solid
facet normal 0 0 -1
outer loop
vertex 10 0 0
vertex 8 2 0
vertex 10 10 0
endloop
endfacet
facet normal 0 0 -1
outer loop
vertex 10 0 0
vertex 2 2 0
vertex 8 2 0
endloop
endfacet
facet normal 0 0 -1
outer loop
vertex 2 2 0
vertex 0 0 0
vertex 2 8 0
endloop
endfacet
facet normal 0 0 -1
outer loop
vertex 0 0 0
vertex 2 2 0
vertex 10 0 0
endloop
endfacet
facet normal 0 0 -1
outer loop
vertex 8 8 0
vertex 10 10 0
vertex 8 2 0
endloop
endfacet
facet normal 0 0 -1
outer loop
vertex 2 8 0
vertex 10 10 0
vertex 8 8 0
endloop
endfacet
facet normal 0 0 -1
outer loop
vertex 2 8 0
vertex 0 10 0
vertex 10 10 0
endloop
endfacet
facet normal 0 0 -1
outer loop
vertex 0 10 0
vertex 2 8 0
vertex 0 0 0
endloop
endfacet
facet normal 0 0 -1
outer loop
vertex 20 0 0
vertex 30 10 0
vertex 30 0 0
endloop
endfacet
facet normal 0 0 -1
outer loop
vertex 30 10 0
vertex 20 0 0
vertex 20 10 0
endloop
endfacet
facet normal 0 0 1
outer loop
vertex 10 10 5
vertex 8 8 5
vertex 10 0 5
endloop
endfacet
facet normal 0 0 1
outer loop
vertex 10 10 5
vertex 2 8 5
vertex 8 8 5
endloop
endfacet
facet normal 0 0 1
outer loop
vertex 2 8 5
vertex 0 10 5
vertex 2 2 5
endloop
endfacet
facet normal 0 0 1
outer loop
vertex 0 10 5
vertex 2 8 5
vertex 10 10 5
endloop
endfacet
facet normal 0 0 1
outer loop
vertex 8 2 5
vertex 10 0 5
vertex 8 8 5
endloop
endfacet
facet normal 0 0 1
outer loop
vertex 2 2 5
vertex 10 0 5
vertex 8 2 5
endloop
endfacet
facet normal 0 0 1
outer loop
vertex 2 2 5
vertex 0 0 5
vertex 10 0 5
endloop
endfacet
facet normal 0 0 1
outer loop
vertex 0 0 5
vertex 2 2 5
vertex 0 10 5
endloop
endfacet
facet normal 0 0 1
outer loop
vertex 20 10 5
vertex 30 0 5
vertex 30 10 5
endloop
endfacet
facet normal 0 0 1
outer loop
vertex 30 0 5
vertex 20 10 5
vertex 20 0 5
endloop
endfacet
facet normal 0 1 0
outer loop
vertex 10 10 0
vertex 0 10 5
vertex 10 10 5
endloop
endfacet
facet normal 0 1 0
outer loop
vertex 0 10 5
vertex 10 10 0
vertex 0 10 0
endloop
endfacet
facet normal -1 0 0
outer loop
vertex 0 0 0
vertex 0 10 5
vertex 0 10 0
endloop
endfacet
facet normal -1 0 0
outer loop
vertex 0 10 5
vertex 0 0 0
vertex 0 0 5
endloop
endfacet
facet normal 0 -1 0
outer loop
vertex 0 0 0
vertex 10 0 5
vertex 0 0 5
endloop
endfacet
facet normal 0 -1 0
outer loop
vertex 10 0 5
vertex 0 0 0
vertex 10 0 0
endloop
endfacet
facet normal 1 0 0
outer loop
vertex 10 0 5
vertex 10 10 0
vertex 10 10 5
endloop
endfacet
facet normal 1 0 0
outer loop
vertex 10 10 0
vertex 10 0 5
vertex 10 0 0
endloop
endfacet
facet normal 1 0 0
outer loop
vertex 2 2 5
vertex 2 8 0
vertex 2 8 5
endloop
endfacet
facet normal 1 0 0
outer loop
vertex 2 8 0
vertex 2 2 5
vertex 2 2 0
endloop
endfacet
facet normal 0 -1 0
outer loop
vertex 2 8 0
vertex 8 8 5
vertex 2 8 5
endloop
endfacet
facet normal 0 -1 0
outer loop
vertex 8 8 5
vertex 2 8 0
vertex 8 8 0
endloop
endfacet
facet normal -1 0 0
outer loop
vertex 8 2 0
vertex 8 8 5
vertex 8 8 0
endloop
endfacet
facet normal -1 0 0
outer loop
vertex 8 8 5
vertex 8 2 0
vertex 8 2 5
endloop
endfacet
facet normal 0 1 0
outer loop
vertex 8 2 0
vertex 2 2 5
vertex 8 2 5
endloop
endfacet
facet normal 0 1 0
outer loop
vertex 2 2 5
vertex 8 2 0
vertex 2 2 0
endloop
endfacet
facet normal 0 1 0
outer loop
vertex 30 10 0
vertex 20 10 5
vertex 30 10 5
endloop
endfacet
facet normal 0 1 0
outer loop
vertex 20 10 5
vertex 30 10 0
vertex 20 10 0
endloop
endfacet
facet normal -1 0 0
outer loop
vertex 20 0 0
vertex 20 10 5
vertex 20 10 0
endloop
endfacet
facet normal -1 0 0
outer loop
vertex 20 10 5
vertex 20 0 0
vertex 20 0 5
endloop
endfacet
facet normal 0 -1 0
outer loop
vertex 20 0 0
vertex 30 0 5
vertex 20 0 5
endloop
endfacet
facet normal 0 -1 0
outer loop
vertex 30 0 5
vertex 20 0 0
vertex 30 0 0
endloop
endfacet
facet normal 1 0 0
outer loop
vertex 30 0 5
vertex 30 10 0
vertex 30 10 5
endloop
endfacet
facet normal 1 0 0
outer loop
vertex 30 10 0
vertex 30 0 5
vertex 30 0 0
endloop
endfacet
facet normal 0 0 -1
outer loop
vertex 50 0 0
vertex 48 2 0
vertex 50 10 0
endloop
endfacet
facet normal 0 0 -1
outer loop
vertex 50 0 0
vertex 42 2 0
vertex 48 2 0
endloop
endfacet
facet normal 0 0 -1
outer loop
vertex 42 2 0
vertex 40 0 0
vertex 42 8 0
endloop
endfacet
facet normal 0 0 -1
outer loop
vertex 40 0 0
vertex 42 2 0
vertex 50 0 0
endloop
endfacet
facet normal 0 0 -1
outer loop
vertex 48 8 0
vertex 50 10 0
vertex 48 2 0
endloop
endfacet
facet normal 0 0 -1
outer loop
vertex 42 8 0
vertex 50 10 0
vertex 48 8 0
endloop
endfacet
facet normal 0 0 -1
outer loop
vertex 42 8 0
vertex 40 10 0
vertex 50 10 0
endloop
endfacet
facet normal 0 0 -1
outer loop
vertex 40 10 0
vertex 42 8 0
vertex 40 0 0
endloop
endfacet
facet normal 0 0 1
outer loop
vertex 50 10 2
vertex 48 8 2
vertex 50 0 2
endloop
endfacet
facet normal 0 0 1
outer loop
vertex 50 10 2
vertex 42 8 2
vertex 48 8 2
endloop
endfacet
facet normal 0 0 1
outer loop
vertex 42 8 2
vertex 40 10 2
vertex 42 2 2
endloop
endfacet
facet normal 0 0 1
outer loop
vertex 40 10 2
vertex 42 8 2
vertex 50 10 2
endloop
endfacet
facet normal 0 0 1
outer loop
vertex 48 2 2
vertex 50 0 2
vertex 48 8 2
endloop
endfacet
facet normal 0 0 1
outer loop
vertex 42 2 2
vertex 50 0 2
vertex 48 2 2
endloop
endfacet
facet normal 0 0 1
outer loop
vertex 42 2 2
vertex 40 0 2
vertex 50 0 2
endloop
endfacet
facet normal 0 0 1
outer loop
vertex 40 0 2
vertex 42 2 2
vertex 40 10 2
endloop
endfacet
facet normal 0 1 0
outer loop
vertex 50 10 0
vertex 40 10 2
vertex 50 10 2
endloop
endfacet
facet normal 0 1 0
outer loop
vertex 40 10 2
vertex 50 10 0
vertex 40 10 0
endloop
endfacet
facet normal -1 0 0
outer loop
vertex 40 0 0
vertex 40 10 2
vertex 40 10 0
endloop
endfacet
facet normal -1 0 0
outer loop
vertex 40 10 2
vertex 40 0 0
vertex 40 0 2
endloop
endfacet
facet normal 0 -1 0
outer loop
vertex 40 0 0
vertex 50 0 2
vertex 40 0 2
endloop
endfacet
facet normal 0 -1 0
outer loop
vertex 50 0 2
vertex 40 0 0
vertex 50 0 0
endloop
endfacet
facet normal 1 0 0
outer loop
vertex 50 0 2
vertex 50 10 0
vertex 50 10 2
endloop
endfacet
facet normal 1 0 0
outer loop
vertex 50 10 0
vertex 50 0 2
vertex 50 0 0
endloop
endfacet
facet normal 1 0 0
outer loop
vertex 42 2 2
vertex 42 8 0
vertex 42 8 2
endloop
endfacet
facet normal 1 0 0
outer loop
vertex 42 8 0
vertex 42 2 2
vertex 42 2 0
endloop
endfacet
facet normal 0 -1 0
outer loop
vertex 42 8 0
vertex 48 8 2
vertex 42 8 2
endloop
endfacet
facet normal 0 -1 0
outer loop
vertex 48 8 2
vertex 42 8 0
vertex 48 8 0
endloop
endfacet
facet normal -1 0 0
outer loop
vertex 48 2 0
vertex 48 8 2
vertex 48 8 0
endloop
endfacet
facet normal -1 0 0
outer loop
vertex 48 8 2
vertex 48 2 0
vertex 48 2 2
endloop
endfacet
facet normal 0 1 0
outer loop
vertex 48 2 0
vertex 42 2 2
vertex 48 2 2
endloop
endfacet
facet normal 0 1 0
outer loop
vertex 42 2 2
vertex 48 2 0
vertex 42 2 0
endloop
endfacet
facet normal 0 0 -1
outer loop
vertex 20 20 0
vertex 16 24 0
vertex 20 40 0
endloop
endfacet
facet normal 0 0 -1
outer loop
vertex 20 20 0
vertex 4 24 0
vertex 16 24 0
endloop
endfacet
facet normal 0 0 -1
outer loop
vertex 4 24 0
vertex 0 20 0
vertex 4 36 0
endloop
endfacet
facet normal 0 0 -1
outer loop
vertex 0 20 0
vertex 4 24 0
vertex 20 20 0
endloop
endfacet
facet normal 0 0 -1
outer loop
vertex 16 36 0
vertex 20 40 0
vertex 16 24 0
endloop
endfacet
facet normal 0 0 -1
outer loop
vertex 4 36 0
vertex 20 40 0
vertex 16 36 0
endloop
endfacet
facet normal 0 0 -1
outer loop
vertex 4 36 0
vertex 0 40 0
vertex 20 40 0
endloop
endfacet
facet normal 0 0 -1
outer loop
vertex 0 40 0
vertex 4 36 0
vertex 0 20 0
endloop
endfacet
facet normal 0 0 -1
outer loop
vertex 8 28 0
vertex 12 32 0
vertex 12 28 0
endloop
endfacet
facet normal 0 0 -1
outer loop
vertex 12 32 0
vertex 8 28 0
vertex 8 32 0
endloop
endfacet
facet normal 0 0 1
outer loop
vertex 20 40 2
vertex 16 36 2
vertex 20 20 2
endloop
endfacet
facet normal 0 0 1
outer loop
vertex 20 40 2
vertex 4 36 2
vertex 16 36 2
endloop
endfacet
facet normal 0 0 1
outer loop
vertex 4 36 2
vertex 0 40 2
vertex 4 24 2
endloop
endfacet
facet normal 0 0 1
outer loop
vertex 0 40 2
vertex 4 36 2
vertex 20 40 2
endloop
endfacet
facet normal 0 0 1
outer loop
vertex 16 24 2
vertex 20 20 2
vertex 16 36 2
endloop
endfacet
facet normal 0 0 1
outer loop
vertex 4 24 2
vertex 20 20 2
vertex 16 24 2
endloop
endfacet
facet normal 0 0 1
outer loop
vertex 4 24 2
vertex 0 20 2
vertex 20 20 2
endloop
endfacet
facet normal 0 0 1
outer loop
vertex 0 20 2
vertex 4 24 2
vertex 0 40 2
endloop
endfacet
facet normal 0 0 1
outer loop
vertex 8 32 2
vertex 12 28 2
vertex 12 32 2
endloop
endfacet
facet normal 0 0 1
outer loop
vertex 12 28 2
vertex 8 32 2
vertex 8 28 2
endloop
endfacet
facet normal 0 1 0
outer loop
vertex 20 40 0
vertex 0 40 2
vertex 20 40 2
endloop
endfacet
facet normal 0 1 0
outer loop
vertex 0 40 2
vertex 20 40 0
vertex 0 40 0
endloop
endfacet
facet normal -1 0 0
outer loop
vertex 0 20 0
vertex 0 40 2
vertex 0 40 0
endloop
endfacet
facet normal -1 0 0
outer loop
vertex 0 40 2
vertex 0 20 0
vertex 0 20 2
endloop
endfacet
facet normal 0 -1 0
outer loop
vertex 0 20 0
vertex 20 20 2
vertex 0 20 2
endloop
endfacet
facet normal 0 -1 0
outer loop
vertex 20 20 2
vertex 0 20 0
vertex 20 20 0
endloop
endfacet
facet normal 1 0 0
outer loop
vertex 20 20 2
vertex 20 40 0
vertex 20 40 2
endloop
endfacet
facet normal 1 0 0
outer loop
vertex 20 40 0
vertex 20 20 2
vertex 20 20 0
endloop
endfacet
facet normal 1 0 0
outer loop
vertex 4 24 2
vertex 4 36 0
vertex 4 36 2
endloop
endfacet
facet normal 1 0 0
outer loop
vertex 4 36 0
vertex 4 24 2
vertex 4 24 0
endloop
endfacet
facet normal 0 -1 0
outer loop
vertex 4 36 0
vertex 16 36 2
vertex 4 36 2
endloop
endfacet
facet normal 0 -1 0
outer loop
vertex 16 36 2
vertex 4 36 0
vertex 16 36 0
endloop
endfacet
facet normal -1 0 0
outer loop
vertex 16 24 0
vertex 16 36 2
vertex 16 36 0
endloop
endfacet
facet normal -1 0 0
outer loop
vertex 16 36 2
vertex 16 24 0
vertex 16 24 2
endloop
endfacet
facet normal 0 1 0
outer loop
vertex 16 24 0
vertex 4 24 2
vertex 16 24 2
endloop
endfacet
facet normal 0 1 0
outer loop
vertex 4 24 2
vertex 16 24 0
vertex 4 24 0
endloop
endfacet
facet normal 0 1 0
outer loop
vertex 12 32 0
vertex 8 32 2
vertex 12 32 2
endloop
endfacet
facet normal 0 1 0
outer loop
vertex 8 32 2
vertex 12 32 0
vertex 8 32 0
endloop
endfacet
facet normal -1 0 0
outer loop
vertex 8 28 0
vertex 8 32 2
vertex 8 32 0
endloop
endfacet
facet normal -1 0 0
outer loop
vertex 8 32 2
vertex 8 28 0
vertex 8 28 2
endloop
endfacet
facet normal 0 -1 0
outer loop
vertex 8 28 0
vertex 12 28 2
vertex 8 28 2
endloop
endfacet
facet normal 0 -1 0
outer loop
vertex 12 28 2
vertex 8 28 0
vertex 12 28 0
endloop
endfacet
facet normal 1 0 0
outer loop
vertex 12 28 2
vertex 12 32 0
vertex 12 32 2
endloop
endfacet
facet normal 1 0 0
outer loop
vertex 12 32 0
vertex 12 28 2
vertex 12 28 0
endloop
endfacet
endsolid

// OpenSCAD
// polygon(): every loop is filled even-odd (Clipper pftEvenOdd), not "first path = boundary, rest = holes"
// two paths side by side are two islands (the second used to be cut away)
linear_extrude(5) polygon(points = [[0,0],[10,0],[10,10],[0,10],[20,0],[30,0],[30,10],[20,10],[2,2],[8,2],[8,8],[2,8]],
    paths = [[0,1,2,3],[4,5,6,7],[8,9,10,11]]);
// a hole listed first, the outline clockwise
translate([40, 0, 0]) linear_extrude(2) polygon(points = [[2,2],[8,2],[8,8],[2,8],[0,0],[0,10],[10,10],[10,0]], paths = [[0,1,2,3],[4,5,6,7]]);
// square, hole, island in the hole
translate([0, 20, 0]) linear_extrude(2) polygon(points = [[0,0],[20,0],[20,20],[0,20],[4,4],[16,4],[16,16],[4,16],[8,8],[12,8],[12,12],[8,12]],
    paths = [[0,1,2,3],[4,5,6,7],[8,9,10,11]]);
